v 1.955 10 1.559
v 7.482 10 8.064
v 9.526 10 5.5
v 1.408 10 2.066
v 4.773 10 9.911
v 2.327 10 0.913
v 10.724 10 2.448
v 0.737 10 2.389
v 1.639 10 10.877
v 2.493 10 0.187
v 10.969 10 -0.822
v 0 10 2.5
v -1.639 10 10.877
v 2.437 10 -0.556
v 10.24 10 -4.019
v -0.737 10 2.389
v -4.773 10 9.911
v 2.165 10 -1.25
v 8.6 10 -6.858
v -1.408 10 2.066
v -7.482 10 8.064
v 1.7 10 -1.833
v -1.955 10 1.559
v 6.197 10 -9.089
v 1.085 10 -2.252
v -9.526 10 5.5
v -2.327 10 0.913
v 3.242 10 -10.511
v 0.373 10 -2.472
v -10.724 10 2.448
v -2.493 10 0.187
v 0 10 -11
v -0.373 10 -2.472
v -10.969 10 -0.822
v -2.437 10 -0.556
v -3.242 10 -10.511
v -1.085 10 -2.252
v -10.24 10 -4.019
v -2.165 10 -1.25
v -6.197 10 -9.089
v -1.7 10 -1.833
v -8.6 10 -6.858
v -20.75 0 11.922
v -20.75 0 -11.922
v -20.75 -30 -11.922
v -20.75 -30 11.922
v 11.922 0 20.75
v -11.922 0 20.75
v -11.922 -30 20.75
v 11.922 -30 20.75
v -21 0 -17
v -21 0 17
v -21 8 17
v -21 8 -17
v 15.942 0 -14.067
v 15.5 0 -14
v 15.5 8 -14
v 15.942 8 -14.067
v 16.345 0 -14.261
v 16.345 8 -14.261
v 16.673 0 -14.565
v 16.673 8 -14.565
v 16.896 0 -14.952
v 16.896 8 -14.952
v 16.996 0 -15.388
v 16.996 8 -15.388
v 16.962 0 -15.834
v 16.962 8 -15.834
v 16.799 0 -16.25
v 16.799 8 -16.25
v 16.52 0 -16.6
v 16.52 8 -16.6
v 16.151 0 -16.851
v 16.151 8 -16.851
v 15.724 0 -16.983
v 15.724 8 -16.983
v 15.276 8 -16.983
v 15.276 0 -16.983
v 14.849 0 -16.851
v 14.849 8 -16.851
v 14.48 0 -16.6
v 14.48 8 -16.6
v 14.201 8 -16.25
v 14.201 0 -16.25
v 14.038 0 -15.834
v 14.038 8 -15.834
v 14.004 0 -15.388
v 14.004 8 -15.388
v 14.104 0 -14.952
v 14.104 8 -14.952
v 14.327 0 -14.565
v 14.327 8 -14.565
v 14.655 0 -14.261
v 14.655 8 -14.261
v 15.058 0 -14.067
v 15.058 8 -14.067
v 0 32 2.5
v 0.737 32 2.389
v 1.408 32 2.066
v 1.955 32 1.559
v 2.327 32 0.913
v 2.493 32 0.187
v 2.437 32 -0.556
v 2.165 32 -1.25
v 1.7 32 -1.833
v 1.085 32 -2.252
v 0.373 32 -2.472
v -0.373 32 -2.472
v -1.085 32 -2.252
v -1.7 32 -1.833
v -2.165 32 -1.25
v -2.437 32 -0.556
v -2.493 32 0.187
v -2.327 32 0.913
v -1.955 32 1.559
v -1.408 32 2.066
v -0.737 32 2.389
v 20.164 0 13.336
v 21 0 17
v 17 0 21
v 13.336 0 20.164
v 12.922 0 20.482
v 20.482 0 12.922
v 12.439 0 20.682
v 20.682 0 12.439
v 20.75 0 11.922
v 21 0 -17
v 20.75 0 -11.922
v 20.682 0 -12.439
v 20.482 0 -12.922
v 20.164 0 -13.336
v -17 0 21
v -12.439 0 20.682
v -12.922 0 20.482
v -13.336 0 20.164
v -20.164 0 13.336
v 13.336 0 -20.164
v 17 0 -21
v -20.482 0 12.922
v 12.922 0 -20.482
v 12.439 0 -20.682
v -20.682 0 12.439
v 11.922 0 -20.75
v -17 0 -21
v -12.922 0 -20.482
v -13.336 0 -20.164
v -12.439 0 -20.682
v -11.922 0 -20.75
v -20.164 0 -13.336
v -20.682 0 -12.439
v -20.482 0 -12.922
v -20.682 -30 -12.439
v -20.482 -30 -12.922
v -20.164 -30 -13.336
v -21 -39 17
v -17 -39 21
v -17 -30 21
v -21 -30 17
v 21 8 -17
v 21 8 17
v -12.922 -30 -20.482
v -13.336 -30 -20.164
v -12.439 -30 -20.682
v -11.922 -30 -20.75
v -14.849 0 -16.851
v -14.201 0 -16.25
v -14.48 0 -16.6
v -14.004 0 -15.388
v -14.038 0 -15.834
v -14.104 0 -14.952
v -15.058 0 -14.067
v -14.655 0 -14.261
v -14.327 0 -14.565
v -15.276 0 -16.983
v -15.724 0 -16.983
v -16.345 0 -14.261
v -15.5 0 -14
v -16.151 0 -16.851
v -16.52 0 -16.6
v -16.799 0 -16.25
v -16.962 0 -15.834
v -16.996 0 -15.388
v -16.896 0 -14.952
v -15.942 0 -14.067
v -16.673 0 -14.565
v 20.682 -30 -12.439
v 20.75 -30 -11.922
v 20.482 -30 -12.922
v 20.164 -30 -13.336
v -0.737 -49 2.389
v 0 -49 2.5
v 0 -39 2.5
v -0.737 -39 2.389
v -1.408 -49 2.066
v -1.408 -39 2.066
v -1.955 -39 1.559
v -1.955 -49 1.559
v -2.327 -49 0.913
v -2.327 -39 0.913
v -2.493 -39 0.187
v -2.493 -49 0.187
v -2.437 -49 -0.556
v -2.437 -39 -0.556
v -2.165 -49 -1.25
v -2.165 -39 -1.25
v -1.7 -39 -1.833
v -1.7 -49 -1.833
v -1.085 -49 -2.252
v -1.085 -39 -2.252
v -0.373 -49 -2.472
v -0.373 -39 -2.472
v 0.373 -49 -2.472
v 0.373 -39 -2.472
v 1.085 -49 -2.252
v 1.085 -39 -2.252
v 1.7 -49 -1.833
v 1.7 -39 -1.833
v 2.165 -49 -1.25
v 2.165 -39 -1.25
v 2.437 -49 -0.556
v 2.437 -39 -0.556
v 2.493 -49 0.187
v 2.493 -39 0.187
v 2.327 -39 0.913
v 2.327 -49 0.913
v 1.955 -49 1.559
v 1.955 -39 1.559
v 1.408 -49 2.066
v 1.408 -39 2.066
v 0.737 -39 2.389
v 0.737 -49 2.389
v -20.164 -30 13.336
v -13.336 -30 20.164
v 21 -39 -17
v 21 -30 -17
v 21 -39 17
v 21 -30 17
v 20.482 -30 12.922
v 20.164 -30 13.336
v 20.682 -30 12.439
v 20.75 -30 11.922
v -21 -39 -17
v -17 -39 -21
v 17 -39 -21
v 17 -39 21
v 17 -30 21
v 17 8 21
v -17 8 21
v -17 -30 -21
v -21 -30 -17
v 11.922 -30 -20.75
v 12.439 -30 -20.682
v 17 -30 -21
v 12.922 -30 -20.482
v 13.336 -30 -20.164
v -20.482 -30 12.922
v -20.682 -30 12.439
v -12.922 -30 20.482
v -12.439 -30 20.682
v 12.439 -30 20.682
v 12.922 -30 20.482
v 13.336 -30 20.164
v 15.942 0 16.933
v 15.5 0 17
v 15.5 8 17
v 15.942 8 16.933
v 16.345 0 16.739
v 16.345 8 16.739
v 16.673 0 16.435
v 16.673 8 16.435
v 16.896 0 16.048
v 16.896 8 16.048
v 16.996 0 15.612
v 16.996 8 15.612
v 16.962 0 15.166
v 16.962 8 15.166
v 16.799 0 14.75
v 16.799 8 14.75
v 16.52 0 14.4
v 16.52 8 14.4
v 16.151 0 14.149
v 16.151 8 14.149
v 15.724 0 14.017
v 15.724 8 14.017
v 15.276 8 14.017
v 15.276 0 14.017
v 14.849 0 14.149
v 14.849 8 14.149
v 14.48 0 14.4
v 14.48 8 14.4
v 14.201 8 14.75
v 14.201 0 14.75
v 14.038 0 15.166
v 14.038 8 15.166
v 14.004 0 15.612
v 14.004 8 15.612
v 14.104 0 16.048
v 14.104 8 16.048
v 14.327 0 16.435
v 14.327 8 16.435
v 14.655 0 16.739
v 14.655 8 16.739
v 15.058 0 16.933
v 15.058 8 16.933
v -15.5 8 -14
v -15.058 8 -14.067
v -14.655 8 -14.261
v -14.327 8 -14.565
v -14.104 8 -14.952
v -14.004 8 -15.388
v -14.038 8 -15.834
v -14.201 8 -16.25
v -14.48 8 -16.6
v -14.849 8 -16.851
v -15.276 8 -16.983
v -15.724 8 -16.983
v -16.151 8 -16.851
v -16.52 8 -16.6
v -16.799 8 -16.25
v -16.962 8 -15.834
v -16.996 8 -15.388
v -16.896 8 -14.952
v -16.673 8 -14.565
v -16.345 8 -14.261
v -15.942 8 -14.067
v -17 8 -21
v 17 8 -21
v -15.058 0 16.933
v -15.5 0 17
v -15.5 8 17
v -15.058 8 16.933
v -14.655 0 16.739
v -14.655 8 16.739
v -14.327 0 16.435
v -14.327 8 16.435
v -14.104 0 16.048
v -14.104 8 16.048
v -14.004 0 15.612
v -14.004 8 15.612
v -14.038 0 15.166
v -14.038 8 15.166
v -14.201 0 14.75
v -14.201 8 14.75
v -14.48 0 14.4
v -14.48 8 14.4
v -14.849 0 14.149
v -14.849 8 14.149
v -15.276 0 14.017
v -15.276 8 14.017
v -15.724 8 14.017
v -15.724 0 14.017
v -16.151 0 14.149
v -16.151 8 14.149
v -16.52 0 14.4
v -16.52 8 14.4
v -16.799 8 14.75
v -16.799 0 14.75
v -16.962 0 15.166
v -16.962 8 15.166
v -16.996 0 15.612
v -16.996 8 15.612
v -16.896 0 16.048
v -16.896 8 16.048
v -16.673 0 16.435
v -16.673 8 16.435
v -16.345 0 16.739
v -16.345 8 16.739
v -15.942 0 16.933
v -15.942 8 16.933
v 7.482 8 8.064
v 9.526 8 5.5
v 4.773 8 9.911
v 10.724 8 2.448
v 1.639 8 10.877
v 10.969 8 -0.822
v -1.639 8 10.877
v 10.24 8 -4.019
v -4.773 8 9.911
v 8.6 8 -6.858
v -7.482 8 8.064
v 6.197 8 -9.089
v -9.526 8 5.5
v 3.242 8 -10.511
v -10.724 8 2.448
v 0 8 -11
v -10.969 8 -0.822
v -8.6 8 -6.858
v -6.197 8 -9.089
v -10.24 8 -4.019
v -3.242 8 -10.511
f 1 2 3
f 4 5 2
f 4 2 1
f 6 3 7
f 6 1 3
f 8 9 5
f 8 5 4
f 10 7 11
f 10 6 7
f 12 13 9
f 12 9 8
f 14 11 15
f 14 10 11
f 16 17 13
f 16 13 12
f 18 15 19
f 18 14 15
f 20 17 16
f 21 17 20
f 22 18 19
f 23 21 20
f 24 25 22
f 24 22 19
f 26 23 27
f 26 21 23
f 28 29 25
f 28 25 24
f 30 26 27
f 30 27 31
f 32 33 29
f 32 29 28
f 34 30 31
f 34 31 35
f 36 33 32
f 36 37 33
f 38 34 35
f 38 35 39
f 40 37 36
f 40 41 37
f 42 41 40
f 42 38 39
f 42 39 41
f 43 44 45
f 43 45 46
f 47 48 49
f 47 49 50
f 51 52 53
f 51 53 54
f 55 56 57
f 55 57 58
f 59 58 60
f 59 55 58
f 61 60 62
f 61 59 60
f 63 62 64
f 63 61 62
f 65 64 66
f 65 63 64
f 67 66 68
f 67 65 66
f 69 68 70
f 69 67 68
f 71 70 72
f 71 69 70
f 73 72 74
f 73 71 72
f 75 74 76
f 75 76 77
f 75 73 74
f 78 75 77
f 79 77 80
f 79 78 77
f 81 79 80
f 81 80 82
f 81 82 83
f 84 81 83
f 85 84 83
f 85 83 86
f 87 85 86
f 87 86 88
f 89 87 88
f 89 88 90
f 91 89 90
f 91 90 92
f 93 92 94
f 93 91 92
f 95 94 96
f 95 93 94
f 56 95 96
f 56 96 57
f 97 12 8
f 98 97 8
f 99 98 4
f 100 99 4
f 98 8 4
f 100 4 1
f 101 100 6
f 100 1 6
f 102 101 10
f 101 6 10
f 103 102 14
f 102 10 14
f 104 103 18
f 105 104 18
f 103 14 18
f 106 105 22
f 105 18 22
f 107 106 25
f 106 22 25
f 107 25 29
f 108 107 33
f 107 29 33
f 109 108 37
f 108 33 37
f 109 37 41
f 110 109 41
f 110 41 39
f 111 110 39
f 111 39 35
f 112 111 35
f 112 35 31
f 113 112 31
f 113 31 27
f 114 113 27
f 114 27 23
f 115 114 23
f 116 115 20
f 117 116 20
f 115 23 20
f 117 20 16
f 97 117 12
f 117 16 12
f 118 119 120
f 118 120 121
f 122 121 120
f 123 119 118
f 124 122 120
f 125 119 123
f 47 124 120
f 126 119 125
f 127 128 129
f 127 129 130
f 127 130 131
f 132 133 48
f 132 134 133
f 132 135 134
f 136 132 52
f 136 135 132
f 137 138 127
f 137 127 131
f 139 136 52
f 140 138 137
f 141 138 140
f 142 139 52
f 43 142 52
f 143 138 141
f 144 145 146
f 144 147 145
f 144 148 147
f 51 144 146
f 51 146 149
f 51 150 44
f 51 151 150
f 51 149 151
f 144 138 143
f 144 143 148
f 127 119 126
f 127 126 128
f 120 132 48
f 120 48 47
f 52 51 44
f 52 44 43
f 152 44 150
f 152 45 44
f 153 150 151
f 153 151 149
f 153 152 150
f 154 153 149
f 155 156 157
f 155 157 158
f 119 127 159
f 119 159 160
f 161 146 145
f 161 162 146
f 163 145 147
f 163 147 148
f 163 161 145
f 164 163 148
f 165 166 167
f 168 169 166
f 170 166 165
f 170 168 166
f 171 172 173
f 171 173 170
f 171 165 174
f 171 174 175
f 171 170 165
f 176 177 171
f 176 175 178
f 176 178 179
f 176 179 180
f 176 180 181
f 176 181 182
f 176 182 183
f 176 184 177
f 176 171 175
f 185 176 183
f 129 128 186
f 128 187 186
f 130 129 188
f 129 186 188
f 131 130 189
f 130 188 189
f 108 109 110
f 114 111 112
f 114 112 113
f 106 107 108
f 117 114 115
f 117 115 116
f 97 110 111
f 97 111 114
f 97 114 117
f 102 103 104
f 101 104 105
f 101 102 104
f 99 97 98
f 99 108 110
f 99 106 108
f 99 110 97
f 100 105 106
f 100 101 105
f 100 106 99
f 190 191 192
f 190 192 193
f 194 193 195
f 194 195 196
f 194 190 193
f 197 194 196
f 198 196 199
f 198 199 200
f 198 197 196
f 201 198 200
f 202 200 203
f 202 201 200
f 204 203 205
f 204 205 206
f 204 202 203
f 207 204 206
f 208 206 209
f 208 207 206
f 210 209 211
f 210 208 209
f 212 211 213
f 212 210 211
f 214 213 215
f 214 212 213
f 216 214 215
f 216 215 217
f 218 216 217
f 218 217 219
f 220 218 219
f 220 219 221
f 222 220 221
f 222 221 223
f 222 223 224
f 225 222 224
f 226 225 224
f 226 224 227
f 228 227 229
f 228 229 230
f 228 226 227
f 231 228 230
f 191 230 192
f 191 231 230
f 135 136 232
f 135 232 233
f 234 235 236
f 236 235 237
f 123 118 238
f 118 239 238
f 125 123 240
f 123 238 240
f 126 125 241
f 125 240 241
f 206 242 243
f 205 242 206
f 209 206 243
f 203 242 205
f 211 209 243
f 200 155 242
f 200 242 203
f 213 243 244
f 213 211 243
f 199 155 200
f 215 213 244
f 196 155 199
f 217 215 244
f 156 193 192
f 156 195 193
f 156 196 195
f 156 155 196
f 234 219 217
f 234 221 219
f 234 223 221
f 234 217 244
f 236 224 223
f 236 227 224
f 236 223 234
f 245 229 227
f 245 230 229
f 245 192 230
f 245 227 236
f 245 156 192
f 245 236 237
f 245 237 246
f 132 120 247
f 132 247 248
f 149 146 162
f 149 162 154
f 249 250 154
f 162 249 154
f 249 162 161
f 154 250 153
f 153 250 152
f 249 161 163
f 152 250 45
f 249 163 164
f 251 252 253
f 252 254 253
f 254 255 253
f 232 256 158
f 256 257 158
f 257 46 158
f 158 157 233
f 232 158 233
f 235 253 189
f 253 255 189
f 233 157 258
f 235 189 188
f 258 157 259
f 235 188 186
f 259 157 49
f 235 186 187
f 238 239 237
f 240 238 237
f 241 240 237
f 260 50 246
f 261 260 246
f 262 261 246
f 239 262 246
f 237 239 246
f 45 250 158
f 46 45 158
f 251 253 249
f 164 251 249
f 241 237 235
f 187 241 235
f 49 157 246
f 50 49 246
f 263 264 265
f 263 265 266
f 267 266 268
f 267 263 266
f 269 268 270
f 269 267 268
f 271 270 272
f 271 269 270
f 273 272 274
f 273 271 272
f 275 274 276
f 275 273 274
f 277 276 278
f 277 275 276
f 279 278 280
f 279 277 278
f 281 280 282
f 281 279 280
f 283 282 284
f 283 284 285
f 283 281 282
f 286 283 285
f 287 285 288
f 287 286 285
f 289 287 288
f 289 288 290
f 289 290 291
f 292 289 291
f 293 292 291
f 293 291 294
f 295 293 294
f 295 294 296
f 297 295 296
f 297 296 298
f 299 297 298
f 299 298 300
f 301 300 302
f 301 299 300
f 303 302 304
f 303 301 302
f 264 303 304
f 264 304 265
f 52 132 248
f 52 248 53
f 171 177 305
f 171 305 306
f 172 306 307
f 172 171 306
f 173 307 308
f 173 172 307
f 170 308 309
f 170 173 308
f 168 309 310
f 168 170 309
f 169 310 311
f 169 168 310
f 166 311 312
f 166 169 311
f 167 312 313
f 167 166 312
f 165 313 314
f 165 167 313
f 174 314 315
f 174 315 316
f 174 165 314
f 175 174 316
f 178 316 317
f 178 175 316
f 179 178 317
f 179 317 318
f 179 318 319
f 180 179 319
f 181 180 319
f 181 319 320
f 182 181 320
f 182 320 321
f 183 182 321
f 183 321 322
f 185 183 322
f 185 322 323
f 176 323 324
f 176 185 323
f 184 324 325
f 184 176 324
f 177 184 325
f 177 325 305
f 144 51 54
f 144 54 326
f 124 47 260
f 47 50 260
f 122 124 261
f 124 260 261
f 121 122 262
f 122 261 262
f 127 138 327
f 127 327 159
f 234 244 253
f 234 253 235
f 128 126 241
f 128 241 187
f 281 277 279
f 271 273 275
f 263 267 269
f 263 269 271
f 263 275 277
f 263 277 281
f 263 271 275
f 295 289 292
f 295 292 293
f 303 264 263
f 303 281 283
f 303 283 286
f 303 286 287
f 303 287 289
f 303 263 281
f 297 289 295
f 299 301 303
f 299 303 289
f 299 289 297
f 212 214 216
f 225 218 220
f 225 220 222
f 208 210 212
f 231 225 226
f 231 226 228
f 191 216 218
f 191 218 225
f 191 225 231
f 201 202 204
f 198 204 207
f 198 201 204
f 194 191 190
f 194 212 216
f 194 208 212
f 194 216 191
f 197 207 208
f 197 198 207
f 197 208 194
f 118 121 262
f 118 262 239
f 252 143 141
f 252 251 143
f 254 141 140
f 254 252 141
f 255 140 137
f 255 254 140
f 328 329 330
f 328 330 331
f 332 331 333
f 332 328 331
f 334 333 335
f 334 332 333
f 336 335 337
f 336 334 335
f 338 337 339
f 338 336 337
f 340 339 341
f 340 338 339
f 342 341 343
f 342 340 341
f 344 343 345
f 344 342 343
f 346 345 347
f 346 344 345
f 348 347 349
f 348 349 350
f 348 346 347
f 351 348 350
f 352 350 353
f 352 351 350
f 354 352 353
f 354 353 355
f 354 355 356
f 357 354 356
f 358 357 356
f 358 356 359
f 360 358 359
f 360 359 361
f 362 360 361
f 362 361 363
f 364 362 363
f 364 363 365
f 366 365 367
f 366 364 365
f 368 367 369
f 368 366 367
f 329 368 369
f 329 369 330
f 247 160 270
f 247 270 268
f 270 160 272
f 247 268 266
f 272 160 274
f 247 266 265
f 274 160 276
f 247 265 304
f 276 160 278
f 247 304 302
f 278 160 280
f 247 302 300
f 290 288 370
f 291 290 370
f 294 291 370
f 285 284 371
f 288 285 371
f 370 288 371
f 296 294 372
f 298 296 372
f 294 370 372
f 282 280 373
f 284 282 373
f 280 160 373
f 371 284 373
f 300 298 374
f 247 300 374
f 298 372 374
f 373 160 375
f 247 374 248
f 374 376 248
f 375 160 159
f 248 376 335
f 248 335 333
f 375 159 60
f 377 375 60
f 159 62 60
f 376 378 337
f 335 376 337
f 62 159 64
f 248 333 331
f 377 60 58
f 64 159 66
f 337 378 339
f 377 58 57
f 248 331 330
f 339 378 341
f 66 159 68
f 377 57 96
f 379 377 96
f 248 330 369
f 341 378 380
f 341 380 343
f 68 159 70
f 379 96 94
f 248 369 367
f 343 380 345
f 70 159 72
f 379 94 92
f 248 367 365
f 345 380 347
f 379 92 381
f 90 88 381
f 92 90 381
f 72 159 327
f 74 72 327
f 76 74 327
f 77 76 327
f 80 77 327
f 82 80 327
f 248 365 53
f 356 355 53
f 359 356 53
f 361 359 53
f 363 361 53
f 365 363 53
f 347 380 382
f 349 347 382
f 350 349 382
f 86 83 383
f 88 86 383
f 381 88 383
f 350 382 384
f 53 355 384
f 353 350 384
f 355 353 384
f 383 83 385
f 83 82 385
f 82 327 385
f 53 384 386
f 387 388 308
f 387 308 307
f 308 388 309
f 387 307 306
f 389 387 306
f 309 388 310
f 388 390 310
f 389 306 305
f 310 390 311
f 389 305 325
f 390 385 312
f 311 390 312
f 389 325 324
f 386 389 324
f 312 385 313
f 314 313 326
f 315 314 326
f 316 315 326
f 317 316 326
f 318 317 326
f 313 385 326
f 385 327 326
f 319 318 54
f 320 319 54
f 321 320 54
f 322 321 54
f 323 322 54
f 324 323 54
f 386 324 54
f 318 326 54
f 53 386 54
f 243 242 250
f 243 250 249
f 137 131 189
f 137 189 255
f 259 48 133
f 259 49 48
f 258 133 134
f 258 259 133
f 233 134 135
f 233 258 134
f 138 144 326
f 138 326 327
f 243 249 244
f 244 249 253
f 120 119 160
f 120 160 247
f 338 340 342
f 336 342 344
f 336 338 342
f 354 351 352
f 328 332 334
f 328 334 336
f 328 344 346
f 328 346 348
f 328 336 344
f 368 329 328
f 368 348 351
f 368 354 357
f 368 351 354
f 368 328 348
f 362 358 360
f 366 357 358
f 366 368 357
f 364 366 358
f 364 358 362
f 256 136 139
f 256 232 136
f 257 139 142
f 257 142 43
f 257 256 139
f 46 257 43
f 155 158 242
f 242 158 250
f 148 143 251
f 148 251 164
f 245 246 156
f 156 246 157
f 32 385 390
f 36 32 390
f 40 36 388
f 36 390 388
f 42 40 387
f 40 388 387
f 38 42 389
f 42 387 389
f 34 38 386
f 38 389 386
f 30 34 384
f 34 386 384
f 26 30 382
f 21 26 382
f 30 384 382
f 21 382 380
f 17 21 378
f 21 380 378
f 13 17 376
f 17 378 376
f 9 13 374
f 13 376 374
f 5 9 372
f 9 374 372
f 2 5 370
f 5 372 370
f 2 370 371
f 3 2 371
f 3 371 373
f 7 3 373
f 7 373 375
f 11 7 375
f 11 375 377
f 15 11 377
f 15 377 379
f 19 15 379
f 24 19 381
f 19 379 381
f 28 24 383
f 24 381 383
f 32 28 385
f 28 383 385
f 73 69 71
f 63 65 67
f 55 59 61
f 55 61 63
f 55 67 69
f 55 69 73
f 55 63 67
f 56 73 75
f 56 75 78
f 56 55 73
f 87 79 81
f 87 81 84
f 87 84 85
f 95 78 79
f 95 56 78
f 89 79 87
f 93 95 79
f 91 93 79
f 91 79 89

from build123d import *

# Parameters (mm, degrees)
SKETCH1_R           = 1.5
BOSS_EXTRUDE1_DEPTH = 8
BOSS_EXTRUDE2_DEPTH = 30
FILLET1_R           = 2
BOSS_EXTRUDE3_DEPTH = 9
SKETCH4_R           = 11
BOSS_EXTRUDE4_DEPTH = 2
SKETCH5_R           = 2.5
BOSS_EXTRUDE5_DEPTH = 22
BOSS_EXTRUDE6_START = 10
SKETCH6_R           = 2.5
BOSS_EXTRUDE6_DEPTH = 10


with BuildPart() as part:
    # Sketch1 → Boss-Extrude1 (new body)
    with BuildSketch(Plane(origin=(0, 0, 0), x_dir=(1, 0, 0), z_dir=(0, 1, 0))):
        Polygon((-17, 21), (17, 21), (21, 17), (21, -17), (17, -21), (-17, -21), (-21, -17), (-21, 17), align=None)
        with Locations(Location((-15.5, 15.5, 0), (0, 0, 270))):
            Circle(SKETCH1_R, mode=Mode.SUBTRACT)
        with Locations(Location((-15.5, -15.5, 0), (0, 0, 270))):
            Circle(SKETCH1_R, mode=Mode.SUBTRACT)
        with Locations(Location((15.5, -15.5, 0), (0, 0, 270))):
            Circle(SKETCH1_R, mode=Mode.SUBTRACT)
        with Locations(Location((15.5, 15.5, 0), (0, 0, 270))):
            Circle(SKETCH1_R, mode=Mode.SUBTRACT)
    extrude(amount=BOSS_EXTRUDE1_DEPTH)

    # Sketch2 → Boss-Extrude2 (add)
    with BuildSketch(Plane.XZ):
        Polygon((-12.75, 20.75), (12.75, 20.75), (20.75, 12.75), (20.75, -12.75), (12.75, -20.75), (-12.75, -20.75), (-20.75, -12.75), (-20.75, 12.75), align=None)
    extrude(amount=BOSS_EXTRUDE2_DEPTH)

    # Fillet1
    fillet1_edges = [part.edges().sort_by_distance(p)[0] for p in [
        (20.75, -15, 12.75),
        (12.75, -15, 20.75),
        (-12.75, -15, 20.75),
        (-20.75, -15, 12.75),
        (-20.75, -15, -12.75),
        (-12.75, -15, -20.75),
        (12.75, -15, -20.75),
        (20.75, -15, -12.75),
    ]]
    fillet(fillet1_edges, radius=FILLET1_R)

    # Sketch3 → Boss-Extrude3 (add)
    with BuildSketch(Plane.XZ.offset(30)):
        Polygon((-21, 17), (-21, -17), (-17, -21), (17, -21), (21, -17), (21, 17), (17, 21), (-17, 21), align=None)
    extrude(amount=BOSS_EXTRUDE3_DEPTH)

    # Sketch4 → Boss-Extrude4 (add)
    with BuildSketch(Plane(origin=(0, 8, 0), x_dir=(1, 0, 0), z_dir=(0, 1, 0))):
        with Locations(Location((0, 0, 0), (0, 0, 90))):
            Circle(SKETCH4_R)
    extrude(amount=BOSS_EXTRUDE4_DEPTH)

    # Sketch5 → Boss-Extrude5 (add)
    with BuildSketch(Plane(origin=(0, 10, 0), x_dir=(1, 0, 0), z_dir=(0, 1, 0))):
        with Locations(Location((0, 0, 0), (0, 0, 270))):
            Circle(SKETCH5_R)
    extrude(amount=BOSS_EXTRUDE5_DEPTH)

    # Sketch6 → Boss-Extrude6 (add)
    with BuildSketch(Plane.XZ.offset(39).offset(BOSS_EXTRUDE6_START)):
        with Locations(Location((0, 0, 0), (0, 0, 90))):
            Circle(SKETCH6_R)
    extrude(amount=-BOSS_EXTRUDE6_DEPTH)


solid = part.part
